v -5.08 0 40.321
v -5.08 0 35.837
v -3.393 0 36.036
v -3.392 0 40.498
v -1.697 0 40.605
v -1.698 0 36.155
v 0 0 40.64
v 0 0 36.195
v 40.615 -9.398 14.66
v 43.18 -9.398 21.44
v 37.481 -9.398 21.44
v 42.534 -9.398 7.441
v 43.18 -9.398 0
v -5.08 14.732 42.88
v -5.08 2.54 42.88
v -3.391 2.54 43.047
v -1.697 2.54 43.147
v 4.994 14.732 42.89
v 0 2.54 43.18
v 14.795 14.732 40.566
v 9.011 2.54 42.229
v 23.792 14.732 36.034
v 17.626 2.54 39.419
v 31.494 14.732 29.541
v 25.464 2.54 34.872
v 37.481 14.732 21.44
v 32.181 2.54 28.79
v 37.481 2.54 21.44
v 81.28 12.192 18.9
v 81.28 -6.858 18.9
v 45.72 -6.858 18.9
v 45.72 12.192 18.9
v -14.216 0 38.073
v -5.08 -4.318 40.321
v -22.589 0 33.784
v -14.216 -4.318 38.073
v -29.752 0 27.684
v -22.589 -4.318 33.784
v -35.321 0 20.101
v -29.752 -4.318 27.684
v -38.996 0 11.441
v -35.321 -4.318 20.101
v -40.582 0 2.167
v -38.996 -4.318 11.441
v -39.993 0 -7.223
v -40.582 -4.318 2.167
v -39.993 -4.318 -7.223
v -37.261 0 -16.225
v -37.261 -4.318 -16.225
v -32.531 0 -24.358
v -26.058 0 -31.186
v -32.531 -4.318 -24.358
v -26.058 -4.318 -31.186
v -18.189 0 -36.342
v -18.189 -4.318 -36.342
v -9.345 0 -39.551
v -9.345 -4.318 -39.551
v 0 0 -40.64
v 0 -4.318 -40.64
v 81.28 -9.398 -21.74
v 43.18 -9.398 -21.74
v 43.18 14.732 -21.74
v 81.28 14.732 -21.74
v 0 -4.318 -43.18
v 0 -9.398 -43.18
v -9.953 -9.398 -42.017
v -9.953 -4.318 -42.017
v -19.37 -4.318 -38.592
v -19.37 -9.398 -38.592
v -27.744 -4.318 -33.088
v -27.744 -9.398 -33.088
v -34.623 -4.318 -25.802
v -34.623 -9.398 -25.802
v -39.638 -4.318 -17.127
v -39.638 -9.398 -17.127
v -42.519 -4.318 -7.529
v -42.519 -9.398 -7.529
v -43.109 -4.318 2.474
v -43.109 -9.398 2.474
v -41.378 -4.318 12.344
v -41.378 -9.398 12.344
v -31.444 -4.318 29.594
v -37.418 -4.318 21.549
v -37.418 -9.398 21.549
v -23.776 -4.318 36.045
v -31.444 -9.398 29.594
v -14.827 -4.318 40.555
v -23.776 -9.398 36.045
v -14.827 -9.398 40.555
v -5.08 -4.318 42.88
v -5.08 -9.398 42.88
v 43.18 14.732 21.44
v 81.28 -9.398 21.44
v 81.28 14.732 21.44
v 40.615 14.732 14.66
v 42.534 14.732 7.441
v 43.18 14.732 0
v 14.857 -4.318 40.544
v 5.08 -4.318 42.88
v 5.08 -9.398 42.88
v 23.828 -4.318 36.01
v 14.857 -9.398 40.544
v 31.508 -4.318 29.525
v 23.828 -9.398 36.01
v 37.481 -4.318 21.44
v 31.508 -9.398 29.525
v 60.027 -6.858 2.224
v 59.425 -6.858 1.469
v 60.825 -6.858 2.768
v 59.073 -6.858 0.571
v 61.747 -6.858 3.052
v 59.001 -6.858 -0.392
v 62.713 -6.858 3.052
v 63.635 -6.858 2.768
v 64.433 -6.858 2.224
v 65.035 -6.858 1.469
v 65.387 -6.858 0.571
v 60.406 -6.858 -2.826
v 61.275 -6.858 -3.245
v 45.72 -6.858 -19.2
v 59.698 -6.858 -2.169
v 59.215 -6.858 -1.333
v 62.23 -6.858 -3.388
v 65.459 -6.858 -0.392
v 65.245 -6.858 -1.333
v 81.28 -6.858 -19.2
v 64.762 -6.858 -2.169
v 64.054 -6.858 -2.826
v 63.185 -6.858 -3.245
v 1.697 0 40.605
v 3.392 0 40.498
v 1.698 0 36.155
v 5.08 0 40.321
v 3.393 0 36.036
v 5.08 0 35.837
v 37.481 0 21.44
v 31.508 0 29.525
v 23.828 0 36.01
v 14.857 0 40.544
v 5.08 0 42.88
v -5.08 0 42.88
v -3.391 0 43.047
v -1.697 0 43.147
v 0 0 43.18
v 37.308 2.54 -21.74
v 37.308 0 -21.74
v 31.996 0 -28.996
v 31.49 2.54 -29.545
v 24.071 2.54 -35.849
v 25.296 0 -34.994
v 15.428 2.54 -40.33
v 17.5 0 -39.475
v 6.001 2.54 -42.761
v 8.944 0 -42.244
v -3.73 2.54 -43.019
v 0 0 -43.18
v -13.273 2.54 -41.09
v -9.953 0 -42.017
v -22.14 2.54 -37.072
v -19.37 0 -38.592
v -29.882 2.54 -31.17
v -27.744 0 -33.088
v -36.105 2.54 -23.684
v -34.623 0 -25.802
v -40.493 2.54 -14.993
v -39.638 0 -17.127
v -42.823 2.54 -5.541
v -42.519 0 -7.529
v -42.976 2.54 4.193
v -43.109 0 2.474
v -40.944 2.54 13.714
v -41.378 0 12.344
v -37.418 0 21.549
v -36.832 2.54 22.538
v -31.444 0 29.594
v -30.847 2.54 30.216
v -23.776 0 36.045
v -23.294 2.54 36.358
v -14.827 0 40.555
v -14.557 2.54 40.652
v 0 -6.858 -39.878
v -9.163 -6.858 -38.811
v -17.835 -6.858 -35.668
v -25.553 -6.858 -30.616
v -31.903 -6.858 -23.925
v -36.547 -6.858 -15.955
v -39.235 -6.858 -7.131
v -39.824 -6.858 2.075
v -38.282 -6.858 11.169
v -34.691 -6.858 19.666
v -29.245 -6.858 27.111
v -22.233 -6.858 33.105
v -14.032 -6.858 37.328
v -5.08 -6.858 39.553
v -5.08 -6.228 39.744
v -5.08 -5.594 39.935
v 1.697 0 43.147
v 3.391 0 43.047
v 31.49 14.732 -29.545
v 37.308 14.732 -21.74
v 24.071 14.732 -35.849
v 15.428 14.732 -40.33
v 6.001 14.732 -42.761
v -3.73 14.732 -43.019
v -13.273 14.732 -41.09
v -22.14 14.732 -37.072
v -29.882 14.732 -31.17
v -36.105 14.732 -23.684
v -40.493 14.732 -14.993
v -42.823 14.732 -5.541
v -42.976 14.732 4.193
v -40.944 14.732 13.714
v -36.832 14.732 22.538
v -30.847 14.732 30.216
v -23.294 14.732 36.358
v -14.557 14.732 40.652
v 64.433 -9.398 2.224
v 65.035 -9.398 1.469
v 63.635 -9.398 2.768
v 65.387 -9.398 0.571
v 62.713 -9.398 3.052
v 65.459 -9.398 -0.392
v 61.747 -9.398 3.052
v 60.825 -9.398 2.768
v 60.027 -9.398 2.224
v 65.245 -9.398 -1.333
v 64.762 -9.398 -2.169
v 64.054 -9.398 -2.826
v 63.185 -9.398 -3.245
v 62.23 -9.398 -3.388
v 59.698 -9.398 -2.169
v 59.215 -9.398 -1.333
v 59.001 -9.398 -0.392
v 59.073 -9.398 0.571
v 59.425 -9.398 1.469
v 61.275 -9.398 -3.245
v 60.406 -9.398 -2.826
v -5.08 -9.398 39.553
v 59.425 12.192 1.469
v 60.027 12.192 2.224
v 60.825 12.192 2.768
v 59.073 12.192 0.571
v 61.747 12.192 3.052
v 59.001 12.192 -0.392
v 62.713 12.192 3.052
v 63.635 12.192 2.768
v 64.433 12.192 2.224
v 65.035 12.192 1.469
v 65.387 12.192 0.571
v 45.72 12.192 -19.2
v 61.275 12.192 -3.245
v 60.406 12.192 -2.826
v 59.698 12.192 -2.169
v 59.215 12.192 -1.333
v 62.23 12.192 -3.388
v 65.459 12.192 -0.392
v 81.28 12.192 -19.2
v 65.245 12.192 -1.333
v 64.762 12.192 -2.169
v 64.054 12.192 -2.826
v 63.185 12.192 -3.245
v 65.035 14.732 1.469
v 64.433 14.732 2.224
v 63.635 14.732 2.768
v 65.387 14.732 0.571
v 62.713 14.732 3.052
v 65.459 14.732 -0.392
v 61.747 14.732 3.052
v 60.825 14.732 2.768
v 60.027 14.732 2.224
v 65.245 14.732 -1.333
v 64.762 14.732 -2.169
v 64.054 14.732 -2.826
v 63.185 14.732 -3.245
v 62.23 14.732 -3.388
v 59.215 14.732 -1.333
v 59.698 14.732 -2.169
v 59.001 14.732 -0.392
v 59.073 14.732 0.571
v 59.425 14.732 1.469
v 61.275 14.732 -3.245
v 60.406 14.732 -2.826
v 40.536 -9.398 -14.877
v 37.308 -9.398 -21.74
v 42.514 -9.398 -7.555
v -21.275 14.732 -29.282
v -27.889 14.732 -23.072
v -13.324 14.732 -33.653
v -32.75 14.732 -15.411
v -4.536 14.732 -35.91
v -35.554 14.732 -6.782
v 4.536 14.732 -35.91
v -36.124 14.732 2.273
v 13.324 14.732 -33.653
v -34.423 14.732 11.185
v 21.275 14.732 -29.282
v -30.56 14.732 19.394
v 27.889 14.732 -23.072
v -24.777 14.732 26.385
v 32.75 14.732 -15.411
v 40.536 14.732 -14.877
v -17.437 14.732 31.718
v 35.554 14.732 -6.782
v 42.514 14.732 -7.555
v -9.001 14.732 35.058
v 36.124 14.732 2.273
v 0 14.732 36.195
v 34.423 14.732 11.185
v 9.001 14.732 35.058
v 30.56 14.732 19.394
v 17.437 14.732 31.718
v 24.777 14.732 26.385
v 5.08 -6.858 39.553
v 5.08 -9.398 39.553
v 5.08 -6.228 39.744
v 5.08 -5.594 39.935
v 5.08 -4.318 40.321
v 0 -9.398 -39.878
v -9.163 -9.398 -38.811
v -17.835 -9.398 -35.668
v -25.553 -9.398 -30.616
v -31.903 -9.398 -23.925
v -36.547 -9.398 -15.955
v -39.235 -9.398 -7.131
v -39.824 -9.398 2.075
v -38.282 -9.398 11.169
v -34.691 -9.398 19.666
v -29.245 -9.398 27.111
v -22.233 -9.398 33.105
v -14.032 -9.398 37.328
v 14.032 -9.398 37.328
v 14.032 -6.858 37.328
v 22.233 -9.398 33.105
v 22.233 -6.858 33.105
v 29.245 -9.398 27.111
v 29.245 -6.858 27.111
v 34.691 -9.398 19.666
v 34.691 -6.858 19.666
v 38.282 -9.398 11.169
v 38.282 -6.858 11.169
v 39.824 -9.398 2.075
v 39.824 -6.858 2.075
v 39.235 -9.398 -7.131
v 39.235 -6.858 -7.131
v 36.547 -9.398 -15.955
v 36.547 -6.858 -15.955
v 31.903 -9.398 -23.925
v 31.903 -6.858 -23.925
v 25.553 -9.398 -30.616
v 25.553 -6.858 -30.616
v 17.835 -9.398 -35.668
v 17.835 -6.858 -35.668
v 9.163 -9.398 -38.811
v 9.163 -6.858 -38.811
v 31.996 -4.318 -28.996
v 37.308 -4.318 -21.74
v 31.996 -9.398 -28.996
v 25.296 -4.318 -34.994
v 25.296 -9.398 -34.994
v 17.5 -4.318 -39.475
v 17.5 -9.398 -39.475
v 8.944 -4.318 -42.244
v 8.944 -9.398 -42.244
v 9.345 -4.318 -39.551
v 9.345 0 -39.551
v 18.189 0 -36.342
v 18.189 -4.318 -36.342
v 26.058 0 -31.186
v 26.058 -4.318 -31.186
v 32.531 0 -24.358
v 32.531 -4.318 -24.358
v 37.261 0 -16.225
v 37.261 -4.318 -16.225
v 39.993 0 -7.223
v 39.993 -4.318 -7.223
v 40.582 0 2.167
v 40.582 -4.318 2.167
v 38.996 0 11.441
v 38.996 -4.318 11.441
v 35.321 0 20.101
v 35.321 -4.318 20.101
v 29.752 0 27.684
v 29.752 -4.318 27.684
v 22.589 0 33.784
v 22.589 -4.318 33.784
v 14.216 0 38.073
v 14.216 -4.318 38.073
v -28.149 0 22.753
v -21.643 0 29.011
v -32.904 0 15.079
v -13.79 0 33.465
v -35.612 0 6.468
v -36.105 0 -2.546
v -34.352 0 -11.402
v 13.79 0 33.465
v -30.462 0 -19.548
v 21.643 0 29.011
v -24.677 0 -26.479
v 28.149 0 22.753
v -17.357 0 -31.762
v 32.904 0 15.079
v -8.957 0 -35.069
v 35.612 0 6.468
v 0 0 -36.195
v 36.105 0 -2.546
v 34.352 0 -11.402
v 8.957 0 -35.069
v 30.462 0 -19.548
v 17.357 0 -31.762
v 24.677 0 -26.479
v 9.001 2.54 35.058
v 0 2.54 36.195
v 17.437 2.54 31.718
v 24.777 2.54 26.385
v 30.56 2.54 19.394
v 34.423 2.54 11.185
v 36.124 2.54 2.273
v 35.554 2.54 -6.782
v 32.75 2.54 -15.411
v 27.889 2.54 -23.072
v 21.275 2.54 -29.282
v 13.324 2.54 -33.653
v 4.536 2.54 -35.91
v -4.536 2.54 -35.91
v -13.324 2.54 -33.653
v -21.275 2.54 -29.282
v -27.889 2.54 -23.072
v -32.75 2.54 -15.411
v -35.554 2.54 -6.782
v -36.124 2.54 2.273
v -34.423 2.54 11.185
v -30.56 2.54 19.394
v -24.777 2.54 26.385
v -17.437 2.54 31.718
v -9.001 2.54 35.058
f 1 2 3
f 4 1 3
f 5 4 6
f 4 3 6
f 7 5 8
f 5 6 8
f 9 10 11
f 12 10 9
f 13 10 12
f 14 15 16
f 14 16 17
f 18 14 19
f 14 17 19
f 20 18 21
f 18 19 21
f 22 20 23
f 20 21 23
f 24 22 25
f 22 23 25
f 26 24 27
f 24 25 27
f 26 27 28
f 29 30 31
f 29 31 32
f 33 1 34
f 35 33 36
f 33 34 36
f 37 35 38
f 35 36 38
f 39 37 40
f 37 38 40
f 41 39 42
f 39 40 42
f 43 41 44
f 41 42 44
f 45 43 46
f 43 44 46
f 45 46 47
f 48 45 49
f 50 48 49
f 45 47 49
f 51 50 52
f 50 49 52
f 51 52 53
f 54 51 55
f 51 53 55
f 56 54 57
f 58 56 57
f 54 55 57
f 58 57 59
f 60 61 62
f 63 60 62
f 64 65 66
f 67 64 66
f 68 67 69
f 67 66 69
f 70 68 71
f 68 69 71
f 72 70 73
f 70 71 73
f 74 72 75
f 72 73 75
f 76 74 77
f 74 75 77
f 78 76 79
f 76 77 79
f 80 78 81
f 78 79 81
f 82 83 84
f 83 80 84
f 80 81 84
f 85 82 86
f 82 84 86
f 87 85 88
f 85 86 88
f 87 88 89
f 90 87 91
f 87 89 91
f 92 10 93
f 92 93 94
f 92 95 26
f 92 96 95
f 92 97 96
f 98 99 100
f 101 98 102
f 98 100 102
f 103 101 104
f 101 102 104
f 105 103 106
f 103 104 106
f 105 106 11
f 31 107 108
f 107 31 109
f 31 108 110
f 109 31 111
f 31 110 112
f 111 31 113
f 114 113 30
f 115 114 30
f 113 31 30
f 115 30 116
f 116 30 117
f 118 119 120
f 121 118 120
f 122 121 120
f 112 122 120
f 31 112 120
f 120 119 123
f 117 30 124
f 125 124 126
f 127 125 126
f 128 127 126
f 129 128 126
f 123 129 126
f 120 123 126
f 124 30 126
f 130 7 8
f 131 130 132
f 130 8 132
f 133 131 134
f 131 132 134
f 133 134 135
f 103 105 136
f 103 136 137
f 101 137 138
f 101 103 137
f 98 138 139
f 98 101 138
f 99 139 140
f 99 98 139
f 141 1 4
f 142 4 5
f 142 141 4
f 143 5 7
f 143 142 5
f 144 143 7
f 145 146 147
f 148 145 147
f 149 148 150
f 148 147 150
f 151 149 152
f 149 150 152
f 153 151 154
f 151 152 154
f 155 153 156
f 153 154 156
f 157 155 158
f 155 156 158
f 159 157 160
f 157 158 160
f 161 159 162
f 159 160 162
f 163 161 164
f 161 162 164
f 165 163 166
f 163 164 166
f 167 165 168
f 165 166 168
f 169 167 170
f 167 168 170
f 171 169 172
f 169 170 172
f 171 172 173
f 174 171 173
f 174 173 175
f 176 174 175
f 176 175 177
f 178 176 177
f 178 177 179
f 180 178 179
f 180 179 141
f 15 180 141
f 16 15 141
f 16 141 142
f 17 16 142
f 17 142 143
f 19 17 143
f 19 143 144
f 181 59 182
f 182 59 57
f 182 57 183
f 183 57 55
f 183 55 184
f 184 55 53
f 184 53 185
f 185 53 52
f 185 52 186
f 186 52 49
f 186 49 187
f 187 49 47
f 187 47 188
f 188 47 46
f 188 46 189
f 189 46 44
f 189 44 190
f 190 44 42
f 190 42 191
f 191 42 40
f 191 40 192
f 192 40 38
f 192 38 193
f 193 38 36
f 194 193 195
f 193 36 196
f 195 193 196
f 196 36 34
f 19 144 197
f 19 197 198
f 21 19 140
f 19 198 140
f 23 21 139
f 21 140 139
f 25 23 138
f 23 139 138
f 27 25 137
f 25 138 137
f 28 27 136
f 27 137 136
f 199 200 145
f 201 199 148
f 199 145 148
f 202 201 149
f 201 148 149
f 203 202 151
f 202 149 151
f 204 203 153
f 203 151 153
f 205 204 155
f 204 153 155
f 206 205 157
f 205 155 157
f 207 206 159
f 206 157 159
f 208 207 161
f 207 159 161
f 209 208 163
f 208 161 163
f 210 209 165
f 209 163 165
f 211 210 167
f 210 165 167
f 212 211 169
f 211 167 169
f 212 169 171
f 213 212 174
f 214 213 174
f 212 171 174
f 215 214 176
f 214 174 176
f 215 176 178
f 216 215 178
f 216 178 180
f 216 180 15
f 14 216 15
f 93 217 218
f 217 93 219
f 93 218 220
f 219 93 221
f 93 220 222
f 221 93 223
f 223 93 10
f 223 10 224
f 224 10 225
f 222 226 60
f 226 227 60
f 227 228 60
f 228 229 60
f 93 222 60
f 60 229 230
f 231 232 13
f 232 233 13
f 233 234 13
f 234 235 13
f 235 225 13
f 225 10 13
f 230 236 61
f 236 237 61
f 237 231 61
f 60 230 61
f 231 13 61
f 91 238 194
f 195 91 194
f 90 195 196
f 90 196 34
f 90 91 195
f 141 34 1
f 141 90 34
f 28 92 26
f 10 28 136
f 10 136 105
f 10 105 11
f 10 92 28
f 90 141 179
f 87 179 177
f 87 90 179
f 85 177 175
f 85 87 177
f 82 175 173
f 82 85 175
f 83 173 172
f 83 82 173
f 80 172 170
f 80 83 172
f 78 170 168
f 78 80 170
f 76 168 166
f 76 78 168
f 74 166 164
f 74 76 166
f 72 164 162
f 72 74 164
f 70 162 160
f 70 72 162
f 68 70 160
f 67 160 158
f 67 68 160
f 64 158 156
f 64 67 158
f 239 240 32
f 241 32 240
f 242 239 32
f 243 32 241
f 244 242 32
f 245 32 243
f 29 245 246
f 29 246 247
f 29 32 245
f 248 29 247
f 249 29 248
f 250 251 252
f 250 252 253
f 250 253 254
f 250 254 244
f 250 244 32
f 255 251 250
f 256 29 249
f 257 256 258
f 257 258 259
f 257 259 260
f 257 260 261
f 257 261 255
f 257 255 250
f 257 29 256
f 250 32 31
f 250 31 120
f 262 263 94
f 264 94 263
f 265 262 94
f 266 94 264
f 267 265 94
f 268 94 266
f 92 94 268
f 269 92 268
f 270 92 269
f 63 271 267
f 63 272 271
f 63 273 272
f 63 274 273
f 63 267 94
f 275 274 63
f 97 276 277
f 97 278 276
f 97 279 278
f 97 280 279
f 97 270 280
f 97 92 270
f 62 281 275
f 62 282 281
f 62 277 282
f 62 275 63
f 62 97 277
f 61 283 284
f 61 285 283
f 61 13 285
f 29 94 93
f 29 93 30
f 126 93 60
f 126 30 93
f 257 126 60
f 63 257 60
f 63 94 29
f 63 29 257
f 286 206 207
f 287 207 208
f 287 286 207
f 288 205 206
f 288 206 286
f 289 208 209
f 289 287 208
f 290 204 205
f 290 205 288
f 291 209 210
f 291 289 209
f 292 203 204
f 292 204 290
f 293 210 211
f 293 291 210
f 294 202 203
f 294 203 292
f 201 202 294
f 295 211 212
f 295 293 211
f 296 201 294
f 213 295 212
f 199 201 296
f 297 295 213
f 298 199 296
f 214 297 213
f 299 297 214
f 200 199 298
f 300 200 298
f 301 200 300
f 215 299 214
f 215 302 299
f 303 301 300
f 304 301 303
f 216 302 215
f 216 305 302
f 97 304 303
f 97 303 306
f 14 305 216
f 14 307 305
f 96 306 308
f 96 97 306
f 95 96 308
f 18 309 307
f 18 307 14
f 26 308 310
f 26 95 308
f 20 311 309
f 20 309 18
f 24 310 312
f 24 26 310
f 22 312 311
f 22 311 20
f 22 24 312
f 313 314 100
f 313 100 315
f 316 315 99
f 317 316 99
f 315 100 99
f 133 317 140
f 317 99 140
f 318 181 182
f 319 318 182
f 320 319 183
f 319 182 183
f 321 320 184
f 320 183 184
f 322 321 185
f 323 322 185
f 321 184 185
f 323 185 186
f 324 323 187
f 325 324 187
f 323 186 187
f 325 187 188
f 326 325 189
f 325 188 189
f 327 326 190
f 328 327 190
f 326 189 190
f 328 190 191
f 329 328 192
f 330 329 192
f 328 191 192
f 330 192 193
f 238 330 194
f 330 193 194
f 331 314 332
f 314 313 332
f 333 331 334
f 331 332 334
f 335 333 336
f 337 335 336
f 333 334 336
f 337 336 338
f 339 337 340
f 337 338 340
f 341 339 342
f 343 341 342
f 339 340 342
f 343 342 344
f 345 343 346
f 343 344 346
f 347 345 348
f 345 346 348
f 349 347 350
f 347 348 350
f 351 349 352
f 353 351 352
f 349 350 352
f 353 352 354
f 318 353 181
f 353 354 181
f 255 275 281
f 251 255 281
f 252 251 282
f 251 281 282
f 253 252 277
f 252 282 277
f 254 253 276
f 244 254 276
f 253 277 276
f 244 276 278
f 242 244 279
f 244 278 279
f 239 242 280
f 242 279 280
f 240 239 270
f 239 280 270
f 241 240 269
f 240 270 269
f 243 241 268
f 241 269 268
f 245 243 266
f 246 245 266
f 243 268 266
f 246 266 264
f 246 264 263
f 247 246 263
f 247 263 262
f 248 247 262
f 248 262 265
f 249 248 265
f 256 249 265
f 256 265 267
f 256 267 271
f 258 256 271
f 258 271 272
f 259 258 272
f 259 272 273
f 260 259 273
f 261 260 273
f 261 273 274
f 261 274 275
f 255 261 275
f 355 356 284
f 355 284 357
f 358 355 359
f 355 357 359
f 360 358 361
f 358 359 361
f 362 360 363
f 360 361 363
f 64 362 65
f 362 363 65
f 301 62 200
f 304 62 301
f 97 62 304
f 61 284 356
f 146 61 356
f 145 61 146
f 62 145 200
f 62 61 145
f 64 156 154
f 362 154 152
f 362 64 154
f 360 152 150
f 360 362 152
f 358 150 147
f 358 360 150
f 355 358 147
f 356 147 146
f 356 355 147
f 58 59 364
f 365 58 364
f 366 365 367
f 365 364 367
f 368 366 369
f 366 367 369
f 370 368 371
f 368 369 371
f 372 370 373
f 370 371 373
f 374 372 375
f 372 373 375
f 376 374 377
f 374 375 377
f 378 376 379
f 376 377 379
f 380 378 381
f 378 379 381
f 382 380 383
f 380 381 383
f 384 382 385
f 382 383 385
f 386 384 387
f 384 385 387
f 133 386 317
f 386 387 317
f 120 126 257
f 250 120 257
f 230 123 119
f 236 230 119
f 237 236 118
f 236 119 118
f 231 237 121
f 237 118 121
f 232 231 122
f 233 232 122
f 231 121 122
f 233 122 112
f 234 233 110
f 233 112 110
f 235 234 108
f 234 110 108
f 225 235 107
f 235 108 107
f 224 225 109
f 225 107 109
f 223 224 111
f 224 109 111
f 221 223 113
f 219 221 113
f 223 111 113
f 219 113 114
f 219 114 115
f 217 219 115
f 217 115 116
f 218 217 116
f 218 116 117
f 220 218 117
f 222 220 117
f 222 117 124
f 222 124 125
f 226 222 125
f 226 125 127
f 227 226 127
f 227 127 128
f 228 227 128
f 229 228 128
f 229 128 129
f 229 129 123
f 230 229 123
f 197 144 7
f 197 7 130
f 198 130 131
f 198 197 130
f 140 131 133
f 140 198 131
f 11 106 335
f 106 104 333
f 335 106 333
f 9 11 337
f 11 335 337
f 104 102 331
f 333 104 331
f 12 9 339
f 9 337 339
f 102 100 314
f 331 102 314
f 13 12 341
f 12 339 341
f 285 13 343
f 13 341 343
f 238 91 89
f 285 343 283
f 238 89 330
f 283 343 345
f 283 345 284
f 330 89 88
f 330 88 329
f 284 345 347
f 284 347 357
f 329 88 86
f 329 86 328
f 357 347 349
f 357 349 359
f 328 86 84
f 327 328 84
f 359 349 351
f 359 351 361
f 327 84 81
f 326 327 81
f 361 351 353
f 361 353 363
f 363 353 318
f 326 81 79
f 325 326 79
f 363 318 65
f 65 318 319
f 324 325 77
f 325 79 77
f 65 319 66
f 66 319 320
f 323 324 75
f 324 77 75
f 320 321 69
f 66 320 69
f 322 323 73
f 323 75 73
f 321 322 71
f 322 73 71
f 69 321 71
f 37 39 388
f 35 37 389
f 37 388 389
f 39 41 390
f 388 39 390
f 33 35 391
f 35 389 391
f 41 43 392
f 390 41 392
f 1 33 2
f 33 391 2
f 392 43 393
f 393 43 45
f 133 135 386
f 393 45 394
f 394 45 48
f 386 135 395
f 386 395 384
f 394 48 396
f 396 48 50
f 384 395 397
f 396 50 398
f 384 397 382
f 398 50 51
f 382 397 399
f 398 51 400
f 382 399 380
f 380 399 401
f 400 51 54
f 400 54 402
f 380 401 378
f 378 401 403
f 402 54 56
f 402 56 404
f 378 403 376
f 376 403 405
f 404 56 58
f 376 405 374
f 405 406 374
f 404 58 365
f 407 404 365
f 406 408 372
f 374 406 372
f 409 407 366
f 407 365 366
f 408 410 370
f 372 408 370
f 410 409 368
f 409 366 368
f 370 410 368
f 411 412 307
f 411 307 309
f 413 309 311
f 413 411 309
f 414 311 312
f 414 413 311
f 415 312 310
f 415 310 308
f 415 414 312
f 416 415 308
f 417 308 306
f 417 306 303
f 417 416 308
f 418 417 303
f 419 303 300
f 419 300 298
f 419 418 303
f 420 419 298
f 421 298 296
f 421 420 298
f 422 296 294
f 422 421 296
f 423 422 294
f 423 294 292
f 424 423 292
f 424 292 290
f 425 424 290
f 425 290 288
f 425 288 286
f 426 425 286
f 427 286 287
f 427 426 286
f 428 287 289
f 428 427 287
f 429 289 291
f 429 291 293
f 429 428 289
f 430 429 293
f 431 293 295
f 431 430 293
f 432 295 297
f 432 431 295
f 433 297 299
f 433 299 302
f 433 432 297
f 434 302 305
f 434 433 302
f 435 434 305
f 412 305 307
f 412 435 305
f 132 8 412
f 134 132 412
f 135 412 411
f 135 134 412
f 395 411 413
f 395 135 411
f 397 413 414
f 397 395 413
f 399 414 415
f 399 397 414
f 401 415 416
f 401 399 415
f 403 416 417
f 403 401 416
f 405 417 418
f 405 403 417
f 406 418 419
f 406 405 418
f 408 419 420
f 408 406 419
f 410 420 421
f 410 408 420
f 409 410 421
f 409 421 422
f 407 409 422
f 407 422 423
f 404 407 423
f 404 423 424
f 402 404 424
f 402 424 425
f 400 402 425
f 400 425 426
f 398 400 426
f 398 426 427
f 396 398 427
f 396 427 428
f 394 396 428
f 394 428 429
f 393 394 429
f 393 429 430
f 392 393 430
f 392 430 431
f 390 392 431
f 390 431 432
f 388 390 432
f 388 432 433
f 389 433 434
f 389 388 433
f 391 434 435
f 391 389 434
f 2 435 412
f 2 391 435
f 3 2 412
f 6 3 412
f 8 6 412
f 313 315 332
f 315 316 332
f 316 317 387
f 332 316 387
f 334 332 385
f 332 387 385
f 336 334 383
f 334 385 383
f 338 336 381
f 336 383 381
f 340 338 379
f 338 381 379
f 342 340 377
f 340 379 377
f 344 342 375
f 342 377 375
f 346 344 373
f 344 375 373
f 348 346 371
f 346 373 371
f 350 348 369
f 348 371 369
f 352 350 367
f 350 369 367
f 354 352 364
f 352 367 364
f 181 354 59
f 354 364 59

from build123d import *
from build123d.topology import SkipClean

# Parameters (mm, degrees)
SKETCH1_R                = 43.18
SKETCH1_R_2              = 38.1
SKETCH1_R_3              = 36.195
BOSS_EXTRUDE1_DEPTH      = 2.54
BOSS_EXTRUDE2_START      = 4.318
SKETCH2_R                = 43.18
SKETCH2_R_2              = 40.64
BOSS_EXTRUDE2_DEPTH      = 4.318
SKETCH7_W                = 5.08
SKETCH7_H                = 10.16
CUT_EXTRUDE1_DEPTH       = 12.7
SKETCH12_R               = 43.18
SKETCH12_R_2             = 36.195
BOSS_EXTRUDE3_DEPTH      = 12.192
BOSS_EXTRUDE4_REACH      = 99.671
BOSS_EXTRUDE4_END_RADIUS = 43.18
SKETCH13_W               = 43.18
SKETCH13_H               = 24.13
BOSS_EXTRUDE5_DEPTH      = 38.1
SKETCH14_W               = 38.1
SKETCH14_H               = 19.05
CUT_EXTRUDE2_DEPTH       = 35.56
SKETCH17_R               = 3.2385
CUT_EXTRUDE3_DEPTH       = 35.56


with BuildPart() as part:
    # Sketch1 → Boss-Extrude1 (new body)
    # profile 1 of 2: a face of its own
    with BuildSketch(Plane(origin=(0, 0, 0), x_dir=(1, 0, 0), z_dir=(0, 1, 0))):
        with Locations(Location((0, 0, 0), (0, 0, 270))):
            Circle(SKETCH1_R)
        Circle(SKETCH1_R_2, mode=Mode.SUBTRACT)
    # profile 2 of 2: a face of its own
    with BuildSketch(Plane(origin=(0, 0, 0), x_dir=(1, 0, 0), z_dir=(0, 1, 0))):
        Circle(SKETCH1_R_2)
        with Locations(Location((0, 0, 0), (0, 0, 270))):
            Circle(SKETCH1_R_3, mode=Mode.SUBTRACT)
    extrude(amount=BOSS_EXTRUDE1_DEPTH)

    # Sketch2 → Boss-Extrude2 (add)
    with BuildSketch(Plane.XZ.offset(BOSS_EXTRUDE2_START)):
        with Locations(Location((0, 0, 0), (0, 0, 270))):
            Circle(SKETCH2_R)
        with Locations(Location((0, 0, 0), (0, 0, 270))):
            Circle(SKETCH2_R_2, mode=Mode.SUBTRACT)
    extrude(amount=-BOSS_EXTRUDE2_DEPTH)

    # Sketch3 → Revolve1 (revolve)
    with BuildSketch(Plane.XY, mode=Mode.PRIVATE) as revolve1_sk:
        Polygon((-40.64, -4.318), (-43.18, -4.318), (-43.18, -9.398), (-39.878, -9.398), (-39.878, -6.858), align=None)
    revolve(revolve1_sk.sketch.rotate(Axis((0, 0, 0), (0, 1, 0)), 270), axis=Axis((0, 0, 0), (0, 1, 0)))

    # Sketch7 → Cut-Extrude1 (cut)
    with SkipClean():  # the faces are left unmerged after this step: merging them gives an invalid solid
        with BuildSketch(Plane.XY.offset(43.18)):
            with Locations((-2.54, -5.08)):
                Rectangle(SKETCH7_W, SKETCH7_H)
            with Locations((2.54, -5.08)):
                Rectangle(SKETCH7_W, SKETCH7_H)
        extrude(amount=-CUT_EXTRUDE1_DEPTH, mode=Mode.SUBTRACT)

    # Sketch12 → Boss-Extrude3 (add)
    with SkipClean():  # the faces are left unmerged after this step: merging them gives an invalid solid
        with BuildSketch(Plane(origin=(0, 2.54, 0), x_dir=(1, 0, 0), z_dir=(0, 1, 0))):
            with Locations(Location((0, 0, 0), (0, 0, 263.243672969))):
                Circle(SKETCH12_R)
            with Locations(Location((0, 0, 0), (0, 0, 270))):
                Circle(SKETCH12_R_2, mode=Mode.SUBTRACT)
        extrude(amount=BOSS_EXTRUDE3_DEPTH)

    # Boss-Extrude4: up to this cylinder (the profile starts outside it)
    with SkipClean():  # the faces are left unmerged after this step: merging them gives an invalid solid
        boss_extrude4_end = Plane(origin=(0, 2.667, 0), z_dir=(0, -1, 0)) * Cylinder(BOSS_EXTRUDE4_END_RADIUS, 286.702, mode=Mode.PRIVATE)
        # Sketch8 → Boss-Extrude4 (add, up to the surface)
        with BuildSketch(Plane(origin=(43.18, 0, 0), x_dir=(0, 0, -1), z_dir=(1, 0, 0)), mode=Mode.PRIVATE) as boss_extrude4_sk1:
            Polygon((0.14993237, -9.398), (21.73993237, -9.398), (21.73993237, 14.732), (-21.44006763, 14.732), (-21.44006763, -9.398), align=None)
        boss_extrude4_tool1 = extrude(boss_extrude4_sk1.sketch, amount=-BOSS_EXTRUDE4_REACH, mode=Mode.PRIVATE) - boss_extrude4_end
        add(boss_extrude4_tool1.solids().sort_by_distance((43.18, 2.667, -0.149932))[0])
        add(boss_extrude4_tool1.solids().sort_by_distance((43.18, 2.667, -0.149932))[1])

    # Sketch13 → Boss-Extrude5 (add)
    with SkipClean():  # the faces are left unmerged after this step: merging them gives an invalid solid
        with BuildSketch(Plane(origin=(43.18, 0, 0), x_dir=(0, 0, -1), z_dir=(1, 0, 0))):
            with Locations((0.14993237, 2.667)):
                Rectangle(SKETCH13_W, SKETCH13_H)
        extrude(amount=BOSS_EXTRUDE5_DEPTH)

    # Sketch14 → Cut-Extrude2 (cut)
    with SkipClean():  # the faces are left unmerged after this step: merging them gives an invalid solid
        with BuildSketch(Plane(origin=(81.28, 0, 0), x_dir=(0, 0, -1), z_dir=(1, 0, 0))):
            with Locations((0.14993237, 2.667)):
                Rectangle(SKETCH14_W, SKETCH14_H)
        extrude(amount=-CUT_EXTRUDE2_DEPTH, mode=Mode.SUBTRACT)

    # Sketch17 → Cut-Extrude3 (cut)
    with SkipClean():  # the faces are left unmerged after this step: merging them gives an invalid solid
        with BuildSketch(Plane(origin=(0, 14.732, 0), x_dir=(1, 0, 0), z_dir=(0, 1, 0))):
            with Locations(Location((62.23, 0.14993237, 0), (0, 0, 90))):
                Circle(SKETCH17_R)
        extrude(amount=-CUT_EXTRUDE3_DEPTH, mode=Mode.SUBTRACT)


solid = part.part
